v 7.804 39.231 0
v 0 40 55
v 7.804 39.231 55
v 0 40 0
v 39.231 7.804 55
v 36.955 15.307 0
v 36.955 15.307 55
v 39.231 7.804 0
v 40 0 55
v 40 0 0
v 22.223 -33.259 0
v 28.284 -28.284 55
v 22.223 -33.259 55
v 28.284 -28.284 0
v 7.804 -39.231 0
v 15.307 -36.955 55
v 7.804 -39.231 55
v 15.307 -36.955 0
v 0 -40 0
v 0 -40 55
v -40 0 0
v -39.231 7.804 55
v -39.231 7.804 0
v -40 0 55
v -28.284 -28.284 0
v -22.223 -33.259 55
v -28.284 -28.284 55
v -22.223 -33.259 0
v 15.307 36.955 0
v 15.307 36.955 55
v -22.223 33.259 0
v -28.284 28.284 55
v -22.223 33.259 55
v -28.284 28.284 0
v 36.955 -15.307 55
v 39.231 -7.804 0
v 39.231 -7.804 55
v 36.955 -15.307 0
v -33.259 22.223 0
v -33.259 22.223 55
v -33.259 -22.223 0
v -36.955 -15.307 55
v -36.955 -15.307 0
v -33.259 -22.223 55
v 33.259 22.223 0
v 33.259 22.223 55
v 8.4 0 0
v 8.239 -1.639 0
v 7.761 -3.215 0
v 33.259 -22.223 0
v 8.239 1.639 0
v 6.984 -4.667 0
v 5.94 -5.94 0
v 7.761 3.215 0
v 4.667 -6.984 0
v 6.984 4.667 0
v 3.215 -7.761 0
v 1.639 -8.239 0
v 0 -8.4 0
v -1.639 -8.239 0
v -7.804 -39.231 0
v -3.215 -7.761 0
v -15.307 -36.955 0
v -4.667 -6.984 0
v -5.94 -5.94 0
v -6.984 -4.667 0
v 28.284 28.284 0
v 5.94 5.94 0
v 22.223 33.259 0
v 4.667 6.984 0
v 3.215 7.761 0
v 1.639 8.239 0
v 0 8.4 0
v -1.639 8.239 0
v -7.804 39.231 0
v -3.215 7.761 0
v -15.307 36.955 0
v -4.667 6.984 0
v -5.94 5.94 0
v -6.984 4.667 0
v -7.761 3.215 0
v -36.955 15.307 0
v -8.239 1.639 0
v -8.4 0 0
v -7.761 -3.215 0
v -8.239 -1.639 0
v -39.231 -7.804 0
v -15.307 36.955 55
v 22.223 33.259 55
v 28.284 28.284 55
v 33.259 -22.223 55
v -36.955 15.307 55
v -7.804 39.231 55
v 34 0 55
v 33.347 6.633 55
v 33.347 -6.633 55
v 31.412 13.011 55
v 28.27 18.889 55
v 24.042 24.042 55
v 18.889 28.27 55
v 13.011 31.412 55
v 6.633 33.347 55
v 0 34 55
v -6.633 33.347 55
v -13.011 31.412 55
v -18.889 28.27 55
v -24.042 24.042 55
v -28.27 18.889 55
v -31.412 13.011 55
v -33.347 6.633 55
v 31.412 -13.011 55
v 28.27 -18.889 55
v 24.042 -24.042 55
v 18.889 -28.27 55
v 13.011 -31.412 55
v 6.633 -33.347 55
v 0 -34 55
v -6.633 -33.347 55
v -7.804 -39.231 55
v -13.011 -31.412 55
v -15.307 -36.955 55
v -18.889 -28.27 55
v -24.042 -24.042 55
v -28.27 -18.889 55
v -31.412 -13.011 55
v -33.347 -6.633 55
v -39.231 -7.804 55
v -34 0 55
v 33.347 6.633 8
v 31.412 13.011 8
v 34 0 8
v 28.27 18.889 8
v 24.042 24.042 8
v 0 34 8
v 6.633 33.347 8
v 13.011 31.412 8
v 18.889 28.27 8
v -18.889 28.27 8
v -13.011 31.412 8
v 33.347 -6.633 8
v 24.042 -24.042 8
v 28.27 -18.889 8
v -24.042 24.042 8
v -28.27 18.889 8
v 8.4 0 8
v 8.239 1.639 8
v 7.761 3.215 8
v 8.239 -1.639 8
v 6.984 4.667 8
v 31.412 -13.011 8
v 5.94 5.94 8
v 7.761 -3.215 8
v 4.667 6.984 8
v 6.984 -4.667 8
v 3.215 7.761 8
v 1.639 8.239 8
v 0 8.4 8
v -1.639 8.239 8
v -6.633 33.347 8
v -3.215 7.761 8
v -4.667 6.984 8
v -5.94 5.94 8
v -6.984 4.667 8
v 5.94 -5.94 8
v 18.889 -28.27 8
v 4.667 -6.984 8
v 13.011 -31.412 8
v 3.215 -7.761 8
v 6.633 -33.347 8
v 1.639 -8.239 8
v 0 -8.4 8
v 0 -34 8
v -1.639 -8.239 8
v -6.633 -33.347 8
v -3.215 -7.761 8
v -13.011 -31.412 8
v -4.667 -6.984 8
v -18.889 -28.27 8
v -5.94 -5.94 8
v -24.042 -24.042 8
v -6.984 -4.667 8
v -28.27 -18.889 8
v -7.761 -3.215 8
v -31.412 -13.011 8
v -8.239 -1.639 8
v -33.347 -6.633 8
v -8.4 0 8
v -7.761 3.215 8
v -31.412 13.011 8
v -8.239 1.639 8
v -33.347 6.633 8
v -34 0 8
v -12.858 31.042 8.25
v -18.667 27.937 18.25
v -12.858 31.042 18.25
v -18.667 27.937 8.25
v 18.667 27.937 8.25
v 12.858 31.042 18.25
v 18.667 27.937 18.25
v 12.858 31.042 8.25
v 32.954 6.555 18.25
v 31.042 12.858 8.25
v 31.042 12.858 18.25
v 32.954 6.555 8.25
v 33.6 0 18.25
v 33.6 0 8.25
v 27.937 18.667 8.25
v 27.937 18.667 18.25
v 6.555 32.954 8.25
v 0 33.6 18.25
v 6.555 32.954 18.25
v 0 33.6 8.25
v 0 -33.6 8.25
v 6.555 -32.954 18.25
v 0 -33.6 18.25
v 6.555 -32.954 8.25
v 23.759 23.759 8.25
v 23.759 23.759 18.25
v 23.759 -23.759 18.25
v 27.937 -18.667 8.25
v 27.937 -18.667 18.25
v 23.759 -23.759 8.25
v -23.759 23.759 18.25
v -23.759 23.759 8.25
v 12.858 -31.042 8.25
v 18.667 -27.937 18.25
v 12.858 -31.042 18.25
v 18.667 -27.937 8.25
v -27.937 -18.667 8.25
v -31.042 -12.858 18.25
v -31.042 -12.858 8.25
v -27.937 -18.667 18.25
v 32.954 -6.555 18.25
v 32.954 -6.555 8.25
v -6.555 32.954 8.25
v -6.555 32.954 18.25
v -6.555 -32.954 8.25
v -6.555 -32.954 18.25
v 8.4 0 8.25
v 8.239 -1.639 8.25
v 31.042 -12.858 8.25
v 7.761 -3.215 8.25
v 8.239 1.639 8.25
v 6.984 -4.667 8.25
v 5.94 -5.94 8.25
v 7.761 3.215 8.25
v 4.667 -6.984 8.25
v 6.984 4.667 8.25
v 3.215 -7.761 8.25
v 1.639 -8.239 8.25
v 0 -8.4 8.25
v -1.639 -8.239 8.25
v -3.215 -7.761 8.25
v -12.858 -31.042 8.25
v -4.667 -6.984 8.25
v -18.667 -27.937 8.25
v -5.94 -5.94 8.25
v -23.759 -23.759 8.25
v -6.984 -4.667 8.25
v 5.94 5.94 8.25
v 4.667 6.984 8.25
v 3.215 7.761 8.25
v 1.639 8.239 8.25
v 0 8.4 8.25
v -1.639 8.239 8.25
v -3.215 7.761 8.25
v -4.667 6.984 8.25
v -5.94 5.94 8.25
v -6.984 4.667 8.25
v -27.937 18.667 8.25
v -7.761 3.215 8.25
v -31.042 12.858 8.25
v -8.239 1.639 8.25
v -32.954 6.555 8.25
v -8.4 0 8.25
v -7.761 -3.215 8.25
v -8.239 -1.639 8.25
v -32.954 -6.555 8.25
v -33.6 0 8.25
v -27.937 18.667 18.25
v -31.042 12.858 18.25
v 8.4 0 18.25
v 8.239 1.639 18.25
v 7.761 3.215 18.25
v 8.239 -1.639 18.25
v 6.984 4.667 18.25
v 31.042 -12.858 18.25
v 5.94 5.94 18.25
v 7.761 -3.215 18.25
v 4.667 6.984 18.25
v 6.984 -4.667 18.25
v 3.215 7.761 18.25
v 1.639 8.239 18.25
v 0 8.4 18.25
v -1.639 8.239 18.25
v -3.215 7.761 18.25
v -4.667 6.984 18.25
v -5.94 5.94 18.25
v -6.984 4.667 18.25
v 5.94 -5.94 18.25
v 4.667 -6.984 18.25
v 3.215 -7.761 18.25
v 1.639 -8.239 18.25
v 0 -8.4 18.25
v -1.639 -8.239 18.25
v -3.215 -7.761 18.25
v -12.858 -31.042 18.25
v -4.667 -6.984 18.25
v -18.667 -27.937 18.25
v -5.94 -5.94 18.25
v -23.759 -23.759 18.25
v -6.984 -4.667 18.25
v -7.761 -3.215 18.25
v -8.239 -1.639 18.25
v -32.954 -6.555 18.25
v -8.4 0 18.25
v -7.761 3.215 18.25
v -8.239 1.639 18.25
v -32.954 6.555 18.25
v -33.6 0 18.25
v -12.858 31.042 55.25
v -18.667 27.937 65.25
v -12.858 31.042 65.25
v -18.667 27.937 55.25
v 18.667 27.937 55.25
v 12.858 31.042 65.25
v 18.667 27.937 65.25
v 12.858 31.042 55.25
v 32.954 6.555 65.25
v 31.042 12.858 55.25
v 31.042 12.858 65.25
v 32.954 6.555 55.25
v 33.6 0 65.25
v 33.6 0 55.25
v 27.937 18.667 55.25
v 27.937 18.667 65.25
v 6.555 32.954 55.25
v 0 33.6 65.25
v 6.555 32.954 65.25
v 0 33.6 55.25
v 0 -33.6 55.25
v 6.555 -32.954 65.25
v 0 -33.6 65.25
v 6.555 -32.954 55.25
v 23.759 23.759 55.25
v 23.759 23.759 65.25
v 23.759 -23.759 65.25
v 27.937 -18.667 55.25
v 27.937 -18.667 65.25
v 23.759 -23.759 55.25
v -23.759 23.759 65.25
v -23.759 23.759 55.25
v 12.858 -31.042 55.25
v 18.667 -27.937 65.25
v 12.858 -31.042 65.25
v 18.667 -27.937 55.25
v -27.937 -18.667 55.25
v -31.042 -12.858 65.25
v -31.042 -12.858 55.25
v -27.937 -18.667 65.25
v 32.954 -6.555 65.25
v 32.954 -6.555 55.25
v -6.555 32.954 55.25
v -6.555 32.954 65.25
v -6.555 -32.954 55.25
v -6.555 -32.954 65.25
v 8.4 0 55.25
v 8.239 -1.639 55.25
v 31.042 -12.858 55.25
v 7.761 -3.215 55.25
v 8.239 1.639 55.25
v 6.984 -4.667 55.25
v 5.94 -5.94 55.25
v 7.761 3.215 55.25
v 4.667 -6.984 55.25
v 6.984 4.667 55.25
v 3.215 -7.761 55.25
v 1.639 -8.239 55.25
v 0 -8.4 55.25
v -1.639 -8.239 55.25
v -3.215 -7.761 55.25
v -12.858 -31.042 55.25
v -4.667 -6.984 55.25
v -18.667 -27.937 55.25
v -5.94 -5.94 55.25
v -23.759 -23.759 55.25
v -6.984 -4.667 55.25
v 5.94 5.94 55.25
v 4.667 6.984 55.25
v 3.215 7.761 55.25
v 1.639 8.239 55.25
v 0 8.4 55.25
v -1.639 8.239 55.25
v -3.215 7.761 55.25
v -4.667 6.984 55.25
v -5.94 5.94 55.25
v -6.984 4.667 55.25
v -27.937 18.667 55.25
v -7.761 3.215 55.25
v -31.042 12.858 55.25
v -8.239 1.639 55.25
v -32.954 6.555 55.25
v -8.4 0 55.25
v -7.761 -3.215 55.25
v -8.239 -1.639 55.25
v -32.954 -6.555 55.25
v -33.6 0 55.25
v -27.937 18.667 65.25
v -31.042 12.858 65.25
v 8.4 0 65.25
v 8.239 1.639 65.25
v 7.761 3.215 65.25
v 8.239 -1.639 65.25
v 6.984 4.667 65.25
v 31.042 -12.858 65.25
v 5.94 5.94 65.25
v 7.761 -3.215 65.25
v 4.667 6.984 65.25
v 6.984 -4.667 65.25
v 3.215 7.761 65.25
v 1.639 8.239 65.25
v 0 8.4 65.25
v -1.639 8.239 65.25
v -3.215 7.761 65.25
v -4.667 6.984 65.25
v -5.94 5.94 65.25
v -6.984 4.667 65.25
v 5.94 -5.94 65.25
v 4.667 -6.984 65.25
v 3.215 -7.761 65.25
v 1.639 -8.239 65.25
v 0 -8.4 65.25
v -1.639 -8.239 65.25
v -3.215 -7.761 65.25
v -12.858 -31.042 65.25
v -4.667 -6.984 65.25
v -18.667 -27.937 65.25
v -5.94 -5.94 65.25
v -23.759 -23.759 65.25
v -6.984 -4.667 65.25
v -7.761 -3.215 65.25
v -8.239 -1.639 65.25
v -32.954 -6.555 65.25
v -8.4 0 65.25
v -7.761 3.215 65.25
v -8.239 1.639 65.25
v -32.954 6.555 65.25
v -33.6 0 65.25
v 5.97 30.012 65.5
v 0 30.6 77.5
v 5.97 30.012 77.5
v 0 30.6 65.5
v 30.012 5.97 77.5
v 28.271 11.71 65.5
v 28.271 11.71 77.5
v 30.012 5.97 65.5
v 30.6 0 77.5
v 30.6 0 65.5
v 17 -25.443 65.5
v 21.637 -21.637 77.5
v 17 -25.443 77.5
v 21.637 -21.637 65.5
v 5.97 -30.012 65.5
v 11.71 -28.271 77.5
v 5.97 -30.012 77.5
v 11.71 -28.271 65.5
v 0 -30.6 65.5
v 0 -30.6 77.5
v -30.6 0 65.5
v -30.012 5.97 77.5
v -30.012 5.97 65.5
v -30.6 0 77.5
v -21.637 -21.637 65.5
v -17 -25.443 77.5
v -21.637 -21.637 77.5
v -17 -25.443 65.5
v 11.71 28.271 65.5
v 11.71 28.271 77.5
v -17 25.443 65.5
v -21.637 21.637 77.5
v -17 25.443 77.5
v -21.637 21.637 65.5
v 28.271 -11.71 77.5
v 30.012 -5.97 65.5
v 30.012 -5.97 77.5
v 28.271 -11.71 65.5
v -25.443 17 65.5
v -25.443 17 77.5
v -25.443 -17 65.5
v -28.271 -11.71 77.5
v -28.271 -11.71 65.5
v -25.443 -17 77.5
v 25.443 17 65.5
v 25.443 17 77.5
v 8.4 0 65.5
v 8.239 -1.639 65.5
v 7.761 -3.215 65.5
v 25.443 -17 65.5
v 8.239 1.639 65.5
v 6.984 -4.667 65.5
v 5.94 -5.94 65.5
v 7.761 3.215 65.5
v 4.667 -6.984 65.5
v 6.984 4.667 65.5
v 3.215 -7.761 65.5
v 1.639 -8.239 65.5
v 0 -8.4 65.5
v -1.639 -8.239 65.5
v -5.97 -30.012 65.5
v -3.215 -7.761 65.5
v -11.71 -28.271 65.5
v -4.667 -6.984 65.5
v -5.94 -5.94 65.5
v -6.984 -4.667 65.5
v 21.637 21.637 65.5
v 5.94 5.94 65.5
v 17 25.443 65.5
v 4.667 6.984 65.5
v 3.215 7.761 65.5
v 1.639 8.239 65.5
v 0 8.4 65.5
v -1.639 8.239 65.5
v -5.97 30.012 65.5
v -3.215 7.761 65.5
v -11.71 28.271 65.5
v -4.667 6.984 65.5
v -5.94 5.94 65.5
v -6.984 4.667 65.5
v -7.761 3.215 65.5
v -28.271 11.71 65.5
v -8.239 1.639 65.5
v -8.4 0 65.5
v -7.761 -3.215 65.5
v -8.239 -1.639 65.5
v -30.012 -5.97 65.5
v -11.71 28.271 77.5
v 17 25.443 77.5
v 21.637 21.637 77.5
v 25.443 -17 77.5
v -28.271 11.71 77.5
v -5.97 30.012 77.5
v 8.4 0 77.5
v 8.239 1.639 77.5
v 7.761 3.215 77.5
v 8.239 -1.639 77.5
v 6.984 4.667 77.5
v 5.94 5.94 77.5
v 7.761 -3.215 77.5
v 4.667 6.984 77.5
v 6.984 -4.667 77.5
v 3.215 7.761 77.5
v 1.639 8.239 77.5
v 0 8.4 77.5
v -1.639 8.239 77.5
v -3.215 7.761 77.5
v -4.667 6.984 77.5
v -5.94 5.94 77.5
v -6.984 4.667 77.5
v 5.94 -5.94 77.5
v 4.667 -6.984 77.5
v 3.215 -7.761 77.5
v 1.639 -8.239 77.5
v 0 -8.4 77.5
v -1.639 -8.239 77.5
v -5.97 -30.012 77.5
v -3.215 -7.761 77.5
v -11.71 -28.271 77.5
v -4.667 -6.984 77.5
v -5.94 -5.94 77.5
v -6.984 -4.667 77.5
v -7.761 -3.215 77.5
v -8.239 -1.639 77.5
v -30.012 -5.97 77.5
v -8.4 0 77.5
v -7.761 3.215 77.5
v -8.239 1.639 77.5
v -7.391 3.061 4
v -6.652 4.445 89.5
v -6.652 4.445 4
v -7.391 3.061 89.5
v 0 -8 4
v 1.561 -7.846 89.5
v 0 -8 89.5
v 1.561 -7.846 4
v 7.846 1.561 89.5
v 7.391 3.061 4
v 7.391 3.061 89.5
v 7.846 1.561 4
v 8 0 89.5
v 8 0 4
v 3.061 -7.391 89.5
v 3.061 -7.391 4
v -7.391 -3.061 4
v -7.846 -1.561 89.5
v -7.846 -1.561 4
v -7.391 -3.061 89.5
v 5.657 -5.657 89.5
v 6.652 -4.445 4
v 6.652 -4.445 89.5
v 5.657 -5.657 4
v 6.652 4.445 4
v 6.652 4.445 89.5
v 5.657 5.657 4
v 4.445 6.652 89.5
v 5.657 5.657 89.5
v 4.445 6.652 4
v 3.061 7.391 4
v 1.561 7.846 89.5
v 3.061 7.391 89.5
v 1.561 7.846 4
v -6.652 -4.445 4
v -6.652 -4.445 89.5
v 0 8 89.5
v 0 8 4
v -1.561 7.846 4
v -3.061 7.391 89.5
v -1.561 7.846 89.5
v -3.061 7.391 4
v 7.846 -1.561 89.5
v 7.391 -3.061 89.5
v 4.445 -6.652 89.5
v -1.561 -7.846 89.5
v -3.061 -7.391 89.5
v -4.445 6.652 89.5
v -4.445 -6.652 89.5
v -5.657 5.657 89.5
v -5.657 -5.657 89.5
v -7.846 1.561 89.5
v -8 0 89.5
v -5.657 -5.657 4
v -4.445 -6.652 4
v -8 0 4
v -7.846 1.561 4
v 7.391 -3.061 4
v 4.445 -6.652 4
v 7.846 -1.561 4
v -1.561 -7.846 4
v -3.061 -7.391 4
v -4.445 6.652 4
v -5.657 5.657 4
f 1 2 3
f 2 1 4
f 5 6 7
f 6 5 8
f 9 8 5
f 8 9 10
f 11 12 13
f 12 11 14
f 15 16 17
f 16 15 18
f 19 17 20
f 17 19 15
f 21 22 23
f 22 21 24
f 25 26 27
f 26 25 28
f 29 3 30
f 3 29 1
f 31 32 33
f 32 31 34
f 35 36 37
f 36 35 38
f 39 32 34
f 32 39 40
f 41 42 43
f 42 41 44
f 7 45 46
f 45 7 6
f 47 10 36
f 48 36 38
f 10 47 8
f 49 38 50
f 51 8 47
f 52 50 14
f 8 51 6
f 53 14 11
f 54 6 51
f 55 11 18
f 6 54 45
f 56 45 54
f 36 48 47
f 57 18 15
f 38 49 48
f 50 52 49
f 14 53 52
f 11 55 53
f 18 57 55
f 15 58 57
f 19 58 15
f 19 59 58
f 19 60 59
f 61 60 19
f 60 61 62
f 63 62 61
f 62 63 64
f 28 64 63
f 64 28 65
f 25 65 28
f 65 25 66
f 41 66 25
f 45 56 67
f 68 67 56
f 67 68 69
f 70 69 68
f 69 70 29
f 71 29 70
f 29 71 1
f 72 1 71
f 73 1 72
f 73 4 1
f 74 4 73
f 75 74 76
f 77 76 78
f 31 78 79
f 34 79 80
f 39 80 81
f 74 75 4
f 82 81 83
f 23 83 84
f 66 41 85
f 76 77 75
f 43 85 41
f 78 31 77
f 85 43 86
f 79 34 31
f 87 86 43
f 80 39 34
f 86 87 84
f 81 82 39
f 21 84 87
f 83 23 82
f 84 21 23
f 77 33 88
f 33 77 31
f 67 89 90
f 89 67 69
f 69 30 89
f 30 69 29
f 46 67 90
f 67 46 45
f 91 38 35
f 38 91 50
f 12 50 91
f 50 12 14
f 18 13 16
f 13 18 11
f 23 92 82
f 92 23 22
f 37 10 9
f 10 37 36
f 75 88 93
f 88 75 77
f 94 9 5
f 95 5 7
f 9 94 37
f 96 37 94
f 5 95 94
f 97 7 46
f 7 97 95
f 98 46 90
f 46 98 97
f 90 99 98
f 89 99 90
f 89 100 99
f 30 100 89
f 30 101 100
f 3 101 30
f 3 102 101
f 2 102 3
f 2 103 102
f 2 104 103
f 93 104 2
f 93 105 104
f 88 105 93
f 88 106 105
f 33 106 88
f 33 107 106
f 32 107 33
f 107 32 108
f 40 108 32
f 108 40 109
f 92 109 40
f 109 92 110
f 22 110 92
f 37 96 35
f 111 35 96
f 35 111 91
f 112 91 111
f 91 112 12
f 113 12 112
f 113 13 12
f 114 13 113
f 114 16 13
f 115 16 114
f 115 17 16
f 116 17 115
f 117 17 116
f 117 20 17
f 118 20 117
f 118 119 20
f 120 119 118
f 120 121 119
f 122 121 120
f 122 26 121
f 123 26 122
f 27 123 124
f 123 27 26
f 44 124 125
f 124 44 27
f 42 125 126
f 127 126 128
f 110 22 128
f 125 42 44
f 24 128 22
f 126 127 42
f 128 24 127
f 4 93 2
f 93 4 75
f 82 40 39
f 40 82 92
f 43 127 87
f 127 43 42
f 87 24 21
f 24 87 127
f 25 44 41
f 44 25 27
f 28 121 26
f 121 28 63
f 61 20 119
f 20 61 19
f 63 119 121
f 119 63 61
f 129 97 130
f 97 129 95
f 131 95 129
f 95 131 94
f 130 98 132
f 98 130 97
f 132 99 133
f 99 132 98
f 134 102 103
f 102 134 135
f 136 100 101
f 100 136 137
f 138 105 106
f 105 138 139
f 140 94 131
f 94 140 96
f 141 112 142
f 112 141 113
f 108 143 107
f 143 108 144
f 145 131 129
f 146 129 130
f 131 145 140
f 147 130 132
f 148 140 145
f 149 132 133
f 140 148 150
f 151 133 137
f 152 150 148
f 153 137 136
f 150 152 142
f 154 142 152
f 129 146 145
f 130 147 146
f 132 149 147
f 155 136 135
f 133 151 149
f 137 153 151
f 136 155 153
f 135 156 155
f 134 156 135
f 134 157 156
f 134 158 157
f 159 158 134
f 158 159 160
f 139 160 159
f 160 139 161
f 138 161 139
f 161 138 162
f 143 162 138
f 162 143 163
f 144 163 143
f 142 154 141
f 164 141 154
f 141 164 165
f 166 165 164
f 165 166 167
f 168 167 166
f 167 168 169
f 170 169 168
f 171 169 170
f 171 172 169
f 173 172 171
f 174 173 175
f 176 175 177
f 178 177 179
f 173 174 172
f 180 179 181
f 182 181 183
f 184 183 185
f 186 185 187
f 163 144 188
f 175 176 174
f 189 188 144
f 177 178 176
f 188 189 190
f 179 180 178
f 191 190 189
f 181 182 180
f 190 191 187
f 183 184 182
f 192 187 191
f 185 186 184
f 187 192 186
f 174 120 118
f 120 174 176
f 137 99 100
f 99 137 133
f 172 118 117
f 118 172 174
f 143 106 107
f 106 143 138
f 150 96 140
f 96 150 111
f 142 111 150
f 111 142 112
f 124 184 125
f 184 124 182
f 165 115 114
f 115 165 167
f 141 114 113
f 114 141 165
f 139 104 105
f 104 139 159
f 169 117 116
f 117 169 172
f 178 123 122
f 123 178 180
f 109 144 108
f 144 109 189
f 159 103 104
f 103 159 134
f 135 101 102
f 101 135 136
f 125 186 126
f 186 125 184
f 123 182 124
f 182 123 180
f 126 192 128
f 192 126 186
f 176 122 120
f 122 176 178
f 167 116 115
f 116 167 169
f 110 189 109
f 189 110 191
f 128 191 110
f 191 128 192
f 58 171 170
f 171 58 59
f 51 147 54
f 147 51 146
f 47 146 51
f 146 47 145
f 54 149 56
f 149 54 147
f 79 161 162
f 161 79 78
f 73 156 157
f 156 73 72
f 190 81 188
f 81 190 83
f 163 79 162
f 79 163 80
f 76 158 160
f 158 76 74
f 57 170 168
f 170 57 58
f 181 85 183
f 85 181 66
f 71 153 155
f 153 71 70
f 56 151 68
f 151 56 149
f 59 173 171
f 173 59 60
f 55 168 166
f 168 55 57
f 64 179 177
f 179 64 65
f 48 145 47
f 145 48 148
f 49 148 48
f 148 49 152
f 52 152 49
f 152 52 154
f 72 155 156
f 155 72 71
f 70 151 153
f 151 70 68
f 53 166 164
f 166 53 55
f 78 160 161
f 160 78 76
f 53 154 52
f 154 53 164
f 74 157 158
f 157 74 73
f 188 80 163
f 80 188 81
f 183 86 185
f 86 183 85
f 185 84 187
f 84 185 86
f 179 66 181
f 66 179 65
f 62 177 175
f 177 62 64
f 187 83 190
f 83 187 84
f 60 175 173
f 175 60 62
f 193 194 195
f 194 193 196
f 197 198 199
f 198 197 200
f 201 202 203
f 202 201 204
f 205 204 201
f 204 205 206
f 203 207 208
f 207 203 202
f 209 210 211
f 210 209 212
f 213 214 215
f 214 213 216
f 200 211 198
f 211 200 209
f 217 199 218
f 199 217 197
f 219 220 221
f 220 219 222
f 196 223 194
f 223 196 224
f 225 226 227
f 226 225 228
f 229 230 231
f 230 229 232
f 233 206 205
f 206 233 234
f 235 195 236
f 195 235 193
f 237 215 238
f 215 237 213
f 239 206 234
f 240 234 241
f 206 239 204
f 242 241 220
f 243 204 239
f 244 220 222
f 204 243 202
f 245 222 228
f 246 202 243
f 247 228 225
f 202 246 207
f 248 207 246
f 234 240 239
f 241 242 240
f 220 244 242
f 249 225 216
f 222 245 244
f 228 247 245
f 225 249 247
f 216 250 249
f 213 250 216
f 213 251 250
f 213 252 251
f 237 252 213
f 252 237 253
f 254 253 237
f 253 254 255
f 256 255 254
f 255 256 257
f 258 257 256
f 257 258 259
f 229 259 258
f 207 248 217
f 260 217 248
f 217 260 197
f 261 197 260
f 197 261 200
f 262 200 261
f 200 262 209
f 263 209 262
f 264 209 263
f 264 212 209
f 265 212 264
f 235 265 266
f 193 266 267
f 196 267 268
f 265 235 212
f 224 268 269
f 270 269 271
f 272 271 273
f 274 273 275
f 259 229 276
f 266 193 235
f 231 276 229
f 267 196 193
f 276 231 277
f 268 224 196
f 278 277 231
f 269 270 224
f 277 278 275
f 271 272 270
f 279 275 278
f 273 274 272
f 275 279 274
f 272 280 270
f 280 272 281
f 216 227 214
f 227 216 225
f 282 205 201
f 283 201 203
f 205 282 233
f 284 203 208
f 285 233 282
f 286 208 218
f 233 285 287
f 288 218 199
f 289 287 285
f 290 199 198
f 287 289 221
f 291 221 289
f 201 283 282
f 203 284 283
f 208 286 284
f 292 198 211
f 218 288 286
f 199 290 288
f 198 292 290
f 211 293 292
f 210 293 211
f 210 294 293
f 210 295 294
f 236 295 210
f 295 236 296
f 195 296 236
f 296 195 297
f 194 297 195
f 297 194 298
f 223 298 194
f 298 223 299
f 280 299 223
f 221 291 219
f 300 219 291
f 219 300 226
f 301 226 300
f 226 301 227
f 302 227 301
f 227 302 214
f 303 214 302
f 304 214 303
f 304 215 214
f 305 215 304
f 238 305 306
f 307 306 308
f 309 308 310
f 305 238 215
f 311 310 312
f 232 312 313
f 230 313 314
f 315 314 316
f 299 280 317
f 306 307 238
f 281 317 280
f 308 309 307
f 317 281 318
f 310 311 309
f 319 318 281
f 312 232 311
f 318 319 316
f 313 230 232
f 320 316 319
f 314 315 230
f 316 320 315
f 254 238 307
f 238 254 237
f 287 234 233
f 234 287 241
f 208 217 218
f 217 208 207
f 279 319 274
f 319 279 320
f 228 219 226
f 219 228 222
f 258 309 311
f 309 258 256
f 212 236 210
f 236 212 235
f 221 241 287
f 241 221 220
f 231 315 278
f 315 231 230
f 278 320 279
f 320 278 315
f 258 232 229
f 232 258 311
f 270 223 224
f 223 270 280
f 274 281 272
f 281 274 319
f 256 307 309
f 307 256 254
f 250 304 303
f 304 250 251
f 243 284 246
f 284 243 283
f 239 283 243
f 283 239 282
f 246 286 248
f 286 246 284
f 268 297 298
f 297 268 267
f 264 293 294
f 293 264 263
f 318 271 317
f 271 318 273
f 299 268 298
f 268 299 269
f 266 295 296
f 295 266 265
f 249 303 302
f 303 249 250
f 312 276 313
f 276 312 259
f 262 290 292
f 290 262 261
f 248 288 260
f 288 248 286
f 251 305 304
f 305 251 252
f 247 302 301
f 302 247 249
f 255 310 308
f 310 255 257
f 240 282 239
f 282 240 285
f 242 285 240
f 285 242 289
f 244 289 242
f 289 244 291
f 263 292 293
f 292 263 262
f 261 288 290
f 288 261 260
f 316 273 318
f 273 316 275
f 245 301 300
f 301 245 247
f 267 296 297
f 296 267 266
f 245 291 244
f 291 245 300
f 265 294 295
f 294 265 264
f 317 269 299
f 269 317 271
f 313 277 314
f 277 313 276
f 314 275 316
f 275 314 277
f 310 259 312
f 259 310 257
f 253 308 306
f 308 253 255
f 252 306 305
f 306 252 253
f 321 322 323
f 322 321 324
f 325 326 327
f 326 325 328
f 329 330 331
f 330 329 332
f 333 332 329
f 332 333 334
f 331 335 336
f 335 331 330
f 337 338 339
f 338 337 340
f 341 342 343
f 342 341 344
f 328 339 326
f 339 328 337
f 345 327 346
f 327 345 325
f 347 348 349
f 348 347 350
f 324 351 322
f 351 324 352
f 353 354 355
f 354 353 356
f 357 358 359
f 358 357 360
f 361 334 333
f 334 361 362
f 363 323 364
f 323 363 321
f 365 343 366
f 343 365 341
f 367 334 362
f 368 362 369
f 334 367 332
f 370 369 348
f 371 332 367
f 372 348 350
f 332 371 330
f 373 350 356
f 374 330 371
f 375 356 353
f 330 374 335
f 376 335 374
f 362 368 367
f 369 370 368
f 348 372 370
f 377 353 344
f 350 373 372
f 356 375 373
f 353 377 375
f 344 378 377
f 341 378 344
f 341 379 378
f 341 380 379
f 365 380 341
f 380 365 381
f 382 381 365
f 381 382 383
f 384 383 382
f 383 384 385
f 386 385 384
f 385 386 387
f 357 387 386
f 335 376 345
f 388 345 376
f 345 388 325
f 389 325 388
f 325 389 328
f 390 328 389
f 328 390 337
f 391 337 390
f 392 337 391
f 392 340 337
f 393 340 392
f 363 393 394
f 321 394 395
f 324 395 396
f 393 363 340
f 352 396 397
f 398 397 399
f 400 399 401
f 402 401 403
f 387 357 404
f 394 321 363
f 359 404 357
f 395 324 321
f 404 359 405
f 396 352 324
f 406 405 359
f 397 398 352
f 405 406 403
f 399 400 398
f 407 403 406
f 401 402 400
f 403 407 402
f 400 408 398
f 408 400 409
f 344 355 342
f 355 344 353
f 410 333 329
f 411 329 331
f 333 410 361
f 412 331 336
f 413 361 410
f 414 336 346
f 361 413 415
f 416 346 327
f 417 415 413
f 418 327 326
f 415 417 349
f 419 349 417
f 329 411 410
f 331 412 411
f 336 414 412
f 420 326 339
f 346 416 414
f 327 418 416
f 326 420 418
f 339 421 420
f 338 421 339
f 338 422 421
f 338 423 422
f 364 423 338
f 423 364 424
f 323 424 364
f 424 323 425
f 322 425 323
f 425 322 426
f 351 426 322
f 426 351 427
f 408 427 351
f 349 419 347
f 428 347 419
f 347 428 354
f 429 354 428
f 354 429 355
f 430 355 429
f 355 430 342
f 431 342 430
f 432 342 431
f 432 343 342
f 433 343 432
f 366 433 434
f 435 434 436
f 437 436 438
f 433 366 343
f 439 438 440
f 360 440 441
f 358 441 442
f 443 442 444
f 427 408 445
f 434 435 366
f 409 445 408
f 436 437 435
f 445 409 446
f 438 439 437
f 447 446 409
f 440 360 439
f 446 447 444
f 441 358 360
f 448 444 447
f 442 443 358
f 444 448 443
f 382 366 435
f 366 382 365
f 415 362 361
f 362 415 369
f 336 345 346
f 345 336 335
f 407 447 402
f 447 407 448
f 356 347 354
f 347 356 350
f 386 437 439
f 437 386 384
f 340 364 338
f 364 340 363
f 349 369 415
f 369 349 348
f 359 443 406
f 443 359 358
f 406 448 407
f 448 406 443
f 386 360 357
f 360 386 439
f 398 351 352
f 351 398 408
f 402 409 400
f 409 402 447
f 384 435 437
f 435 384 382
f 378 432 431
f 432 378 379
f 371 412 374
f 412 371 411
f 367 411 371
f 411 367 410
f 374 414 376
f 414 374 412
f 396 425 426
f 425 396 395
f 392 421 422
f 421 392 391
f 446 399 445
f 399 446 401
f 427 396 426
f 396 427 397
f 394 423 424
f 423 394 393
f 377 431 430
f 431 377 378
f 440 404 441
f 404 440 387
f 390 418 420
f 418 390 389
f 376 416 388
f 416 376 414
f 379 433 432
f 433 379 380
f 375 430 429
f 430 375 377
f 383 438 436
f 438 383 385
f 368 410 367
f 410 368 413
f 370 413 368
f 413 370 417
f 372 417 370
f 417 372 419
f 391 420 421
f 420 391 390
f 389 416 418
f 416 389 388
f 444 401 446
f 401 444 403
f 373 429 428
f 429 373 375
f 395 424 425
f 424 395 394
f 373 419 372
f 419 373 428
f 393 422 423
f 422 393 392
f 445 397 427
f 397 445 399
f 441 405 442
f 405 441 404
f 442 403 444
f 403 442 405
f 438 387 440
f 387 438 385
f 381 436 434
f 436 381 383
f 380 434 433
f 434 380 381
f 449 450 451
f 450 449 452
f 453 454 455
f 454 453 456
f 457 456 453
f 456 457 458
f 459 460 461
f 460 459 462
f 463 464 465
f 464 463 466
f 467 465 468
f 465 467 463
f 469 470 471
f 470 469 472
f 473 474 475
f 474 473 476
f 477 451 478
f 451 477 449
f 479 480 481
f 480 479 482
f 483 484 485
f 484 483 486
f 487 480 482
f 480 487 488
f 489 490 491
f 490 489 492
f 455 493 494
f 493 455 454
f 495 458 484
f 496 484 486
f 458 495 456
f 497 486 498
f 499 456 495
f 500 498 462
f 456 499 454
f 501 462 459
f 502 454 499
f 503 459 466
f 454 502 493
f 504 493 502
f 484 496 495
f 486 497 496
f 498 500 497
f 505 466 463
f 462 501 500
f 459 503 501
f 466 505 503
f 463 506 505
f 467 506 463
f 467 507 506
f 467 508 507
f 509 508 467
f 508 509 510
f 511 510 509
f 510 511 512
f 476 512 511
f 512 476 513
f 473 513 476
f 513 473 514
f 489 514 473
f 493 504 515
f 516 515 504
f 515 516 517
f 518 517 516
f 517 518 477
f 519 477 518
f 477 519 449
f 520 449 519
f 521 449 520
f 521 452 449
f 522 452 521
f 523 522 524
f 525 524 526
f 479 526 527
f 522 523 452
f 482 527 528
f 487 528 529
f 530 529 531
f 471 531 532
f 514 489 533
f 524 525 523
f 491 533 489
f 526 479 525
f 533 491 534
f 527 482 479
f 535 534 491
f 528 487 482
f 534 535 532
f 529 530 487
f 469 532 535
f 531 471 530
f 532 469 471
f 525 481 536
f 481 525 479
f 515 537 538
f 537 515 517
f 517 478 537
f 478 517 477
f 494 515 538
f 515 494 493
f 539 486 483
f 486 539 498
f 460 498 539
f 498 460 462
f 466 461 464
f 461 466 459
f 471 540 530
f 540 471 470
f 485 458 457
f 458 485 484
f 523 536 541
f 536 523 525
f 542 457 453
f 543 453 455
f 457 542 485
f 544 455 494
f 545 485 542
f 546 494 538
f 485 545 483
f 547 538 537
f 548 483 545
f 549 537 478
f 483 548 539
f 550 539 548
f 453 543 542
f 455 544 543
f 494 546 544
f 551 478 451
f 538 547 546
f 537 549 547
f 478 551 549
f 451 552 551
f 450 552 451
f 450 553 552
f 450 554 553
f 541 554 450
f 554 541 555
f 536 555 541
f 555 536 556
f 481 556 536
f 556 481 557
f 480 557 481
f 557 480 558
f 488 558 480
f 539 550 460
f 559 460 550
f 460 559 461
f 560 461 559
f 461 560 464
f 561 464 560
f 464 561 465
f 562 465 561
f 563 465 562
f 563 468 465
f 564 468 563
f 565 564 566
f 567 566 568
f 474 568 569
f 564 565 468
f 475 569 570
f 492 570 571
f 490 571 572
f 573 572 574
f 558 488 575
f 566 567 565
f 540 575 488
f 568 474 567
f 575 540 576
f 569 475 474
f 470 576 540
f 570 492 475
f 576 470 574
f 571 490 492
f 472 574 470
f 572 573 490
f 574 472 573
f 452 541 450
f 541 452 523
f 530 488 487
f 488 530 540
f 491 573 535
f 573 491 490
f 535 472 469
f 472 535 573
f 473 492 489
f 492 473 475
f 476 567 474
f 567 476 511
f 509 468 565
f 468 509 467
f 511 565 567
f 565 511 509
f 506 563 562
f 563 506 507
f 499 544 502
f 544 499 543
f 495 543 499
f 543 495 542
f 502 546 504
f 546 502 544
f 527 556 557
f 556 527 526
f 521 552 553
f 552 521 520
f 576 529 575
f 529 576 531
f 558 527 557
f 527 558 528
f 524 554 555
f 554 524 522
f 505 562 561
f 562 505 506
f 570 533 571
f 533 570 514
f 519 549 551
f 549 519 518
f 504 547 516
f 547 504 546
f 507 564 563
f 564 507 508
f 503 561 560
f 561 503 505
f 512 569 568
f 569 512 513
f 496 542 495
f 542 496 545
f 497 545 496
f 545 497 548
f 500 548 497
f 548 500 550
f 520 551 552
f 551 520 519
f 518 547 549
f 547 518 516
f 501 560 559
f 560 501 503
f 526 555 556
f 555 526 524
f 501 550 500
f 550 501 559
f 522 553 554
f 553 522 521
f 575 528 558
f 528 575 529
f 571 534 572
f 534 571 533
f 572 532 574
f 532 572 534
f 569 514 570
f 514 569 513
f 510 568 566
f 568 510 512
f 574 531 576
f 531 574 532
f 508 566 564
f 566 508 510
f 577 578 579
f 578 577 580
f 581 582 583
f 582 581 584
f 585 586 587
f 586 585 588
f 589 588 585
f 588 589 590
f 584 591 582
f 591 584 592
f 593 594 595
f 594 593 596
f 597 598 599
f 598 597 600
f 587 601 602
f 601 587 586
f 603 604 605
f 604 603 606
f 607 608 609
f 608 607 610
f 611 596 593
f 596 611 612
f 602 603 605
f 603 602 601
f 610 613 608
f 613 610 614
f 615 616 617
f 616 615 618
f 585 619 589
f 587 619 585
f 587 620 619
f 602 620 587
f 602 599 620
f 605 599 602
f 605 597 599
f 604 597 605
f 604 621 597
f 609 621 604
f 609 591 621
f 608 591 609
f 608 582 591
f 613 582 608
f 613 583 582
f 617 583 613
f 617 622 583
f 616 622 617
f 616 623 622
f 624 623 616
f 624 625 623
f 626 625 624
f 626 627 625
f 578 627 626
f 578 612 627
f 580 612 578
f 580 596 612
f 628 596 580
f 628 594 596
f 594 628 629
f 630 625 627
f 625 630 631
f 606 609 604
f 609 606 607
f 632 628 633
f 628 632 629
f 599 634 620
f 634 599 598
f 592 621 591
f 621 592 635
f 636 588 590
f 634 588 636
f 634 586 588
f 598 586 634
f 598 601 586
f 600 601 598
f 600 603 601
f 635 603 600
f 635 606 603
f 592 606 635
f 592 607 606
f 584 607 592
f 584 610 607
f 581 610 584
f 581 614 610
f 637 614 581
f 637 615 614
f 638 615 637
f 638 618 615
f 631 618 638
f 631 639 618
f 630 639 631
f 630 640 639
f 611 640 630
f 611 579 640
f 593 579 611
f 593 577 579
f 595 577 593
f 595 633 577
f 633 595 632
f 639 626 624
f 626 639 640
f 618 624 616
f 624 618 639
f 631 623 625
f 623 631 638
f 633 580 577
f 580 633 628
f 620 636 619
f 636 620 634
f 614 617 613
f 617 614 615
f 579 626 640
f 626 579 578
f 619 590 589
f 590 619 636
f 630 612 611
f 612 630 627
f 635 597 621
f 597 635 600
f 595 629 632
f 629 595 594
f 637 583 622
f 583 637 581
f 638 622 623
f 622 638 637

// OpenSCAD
$fn = 32;

// ------------------------------------------------------------------------
// Bearing housing: housing d80, two bearings and a shaft
// Every part is its own module, assembly() places them once.
// ------------------------------------------------------------------------

// --- part 1 ---
module housing() {
  difference() {
    cylinder(h = 55, d = 80);
    translate([0, 0, 8]) cylinder(h = 48, d = 68);
    translate([0, 0, -1]) cylinder(h = 10, d = 16.8);
  }
}

// --- part 2 ---
module bearing_lower() {
  difference() {
      translate([0, 0, 0]) cylinder(h = 10, d = 67.2);
      translate([0, 0, -1]) cylinder(h = 12, d = 16.8);
    }
}

// --- part 3 ---
module bearing_upper() {
  difference() {
      translate([0, 0, 0]) cylinder(h = 10, d = 67.2);
      translate([0, 0, -1]) cylinder(h = 12, d = 16.8);
    }
}

// --- part 4 ---
module spacer() {
  difference() {
      translate([0, 0, 0]) cylinder(h = 12, d = 61.2);
      translate([0, 0, -1]) cylinder(h = 14, d = 16.8);
    }
}

// --- part 5 ---
module shaft() {
  translate([0, 0, -42.75]) cylinder(h = 85.5, d = 16);
}

// --- assembly ---
module assembly() {
  translate([0, 0, 0]) rotate([0, 0, 0]) housing();
  translate([0, 0, 8.25]) rotate([0, 0, 0]) bearing_lower();
  translate([0, 0, 55.25]) rotate([0, 0, 0]) bearing_upper();
  translate([0, 0, 65.5]) rotate([0, 0, 0]) spacer();
  translate([0, 0, 46.75]) rotate([0, 0, 0]) shaft();
}

assembly();
